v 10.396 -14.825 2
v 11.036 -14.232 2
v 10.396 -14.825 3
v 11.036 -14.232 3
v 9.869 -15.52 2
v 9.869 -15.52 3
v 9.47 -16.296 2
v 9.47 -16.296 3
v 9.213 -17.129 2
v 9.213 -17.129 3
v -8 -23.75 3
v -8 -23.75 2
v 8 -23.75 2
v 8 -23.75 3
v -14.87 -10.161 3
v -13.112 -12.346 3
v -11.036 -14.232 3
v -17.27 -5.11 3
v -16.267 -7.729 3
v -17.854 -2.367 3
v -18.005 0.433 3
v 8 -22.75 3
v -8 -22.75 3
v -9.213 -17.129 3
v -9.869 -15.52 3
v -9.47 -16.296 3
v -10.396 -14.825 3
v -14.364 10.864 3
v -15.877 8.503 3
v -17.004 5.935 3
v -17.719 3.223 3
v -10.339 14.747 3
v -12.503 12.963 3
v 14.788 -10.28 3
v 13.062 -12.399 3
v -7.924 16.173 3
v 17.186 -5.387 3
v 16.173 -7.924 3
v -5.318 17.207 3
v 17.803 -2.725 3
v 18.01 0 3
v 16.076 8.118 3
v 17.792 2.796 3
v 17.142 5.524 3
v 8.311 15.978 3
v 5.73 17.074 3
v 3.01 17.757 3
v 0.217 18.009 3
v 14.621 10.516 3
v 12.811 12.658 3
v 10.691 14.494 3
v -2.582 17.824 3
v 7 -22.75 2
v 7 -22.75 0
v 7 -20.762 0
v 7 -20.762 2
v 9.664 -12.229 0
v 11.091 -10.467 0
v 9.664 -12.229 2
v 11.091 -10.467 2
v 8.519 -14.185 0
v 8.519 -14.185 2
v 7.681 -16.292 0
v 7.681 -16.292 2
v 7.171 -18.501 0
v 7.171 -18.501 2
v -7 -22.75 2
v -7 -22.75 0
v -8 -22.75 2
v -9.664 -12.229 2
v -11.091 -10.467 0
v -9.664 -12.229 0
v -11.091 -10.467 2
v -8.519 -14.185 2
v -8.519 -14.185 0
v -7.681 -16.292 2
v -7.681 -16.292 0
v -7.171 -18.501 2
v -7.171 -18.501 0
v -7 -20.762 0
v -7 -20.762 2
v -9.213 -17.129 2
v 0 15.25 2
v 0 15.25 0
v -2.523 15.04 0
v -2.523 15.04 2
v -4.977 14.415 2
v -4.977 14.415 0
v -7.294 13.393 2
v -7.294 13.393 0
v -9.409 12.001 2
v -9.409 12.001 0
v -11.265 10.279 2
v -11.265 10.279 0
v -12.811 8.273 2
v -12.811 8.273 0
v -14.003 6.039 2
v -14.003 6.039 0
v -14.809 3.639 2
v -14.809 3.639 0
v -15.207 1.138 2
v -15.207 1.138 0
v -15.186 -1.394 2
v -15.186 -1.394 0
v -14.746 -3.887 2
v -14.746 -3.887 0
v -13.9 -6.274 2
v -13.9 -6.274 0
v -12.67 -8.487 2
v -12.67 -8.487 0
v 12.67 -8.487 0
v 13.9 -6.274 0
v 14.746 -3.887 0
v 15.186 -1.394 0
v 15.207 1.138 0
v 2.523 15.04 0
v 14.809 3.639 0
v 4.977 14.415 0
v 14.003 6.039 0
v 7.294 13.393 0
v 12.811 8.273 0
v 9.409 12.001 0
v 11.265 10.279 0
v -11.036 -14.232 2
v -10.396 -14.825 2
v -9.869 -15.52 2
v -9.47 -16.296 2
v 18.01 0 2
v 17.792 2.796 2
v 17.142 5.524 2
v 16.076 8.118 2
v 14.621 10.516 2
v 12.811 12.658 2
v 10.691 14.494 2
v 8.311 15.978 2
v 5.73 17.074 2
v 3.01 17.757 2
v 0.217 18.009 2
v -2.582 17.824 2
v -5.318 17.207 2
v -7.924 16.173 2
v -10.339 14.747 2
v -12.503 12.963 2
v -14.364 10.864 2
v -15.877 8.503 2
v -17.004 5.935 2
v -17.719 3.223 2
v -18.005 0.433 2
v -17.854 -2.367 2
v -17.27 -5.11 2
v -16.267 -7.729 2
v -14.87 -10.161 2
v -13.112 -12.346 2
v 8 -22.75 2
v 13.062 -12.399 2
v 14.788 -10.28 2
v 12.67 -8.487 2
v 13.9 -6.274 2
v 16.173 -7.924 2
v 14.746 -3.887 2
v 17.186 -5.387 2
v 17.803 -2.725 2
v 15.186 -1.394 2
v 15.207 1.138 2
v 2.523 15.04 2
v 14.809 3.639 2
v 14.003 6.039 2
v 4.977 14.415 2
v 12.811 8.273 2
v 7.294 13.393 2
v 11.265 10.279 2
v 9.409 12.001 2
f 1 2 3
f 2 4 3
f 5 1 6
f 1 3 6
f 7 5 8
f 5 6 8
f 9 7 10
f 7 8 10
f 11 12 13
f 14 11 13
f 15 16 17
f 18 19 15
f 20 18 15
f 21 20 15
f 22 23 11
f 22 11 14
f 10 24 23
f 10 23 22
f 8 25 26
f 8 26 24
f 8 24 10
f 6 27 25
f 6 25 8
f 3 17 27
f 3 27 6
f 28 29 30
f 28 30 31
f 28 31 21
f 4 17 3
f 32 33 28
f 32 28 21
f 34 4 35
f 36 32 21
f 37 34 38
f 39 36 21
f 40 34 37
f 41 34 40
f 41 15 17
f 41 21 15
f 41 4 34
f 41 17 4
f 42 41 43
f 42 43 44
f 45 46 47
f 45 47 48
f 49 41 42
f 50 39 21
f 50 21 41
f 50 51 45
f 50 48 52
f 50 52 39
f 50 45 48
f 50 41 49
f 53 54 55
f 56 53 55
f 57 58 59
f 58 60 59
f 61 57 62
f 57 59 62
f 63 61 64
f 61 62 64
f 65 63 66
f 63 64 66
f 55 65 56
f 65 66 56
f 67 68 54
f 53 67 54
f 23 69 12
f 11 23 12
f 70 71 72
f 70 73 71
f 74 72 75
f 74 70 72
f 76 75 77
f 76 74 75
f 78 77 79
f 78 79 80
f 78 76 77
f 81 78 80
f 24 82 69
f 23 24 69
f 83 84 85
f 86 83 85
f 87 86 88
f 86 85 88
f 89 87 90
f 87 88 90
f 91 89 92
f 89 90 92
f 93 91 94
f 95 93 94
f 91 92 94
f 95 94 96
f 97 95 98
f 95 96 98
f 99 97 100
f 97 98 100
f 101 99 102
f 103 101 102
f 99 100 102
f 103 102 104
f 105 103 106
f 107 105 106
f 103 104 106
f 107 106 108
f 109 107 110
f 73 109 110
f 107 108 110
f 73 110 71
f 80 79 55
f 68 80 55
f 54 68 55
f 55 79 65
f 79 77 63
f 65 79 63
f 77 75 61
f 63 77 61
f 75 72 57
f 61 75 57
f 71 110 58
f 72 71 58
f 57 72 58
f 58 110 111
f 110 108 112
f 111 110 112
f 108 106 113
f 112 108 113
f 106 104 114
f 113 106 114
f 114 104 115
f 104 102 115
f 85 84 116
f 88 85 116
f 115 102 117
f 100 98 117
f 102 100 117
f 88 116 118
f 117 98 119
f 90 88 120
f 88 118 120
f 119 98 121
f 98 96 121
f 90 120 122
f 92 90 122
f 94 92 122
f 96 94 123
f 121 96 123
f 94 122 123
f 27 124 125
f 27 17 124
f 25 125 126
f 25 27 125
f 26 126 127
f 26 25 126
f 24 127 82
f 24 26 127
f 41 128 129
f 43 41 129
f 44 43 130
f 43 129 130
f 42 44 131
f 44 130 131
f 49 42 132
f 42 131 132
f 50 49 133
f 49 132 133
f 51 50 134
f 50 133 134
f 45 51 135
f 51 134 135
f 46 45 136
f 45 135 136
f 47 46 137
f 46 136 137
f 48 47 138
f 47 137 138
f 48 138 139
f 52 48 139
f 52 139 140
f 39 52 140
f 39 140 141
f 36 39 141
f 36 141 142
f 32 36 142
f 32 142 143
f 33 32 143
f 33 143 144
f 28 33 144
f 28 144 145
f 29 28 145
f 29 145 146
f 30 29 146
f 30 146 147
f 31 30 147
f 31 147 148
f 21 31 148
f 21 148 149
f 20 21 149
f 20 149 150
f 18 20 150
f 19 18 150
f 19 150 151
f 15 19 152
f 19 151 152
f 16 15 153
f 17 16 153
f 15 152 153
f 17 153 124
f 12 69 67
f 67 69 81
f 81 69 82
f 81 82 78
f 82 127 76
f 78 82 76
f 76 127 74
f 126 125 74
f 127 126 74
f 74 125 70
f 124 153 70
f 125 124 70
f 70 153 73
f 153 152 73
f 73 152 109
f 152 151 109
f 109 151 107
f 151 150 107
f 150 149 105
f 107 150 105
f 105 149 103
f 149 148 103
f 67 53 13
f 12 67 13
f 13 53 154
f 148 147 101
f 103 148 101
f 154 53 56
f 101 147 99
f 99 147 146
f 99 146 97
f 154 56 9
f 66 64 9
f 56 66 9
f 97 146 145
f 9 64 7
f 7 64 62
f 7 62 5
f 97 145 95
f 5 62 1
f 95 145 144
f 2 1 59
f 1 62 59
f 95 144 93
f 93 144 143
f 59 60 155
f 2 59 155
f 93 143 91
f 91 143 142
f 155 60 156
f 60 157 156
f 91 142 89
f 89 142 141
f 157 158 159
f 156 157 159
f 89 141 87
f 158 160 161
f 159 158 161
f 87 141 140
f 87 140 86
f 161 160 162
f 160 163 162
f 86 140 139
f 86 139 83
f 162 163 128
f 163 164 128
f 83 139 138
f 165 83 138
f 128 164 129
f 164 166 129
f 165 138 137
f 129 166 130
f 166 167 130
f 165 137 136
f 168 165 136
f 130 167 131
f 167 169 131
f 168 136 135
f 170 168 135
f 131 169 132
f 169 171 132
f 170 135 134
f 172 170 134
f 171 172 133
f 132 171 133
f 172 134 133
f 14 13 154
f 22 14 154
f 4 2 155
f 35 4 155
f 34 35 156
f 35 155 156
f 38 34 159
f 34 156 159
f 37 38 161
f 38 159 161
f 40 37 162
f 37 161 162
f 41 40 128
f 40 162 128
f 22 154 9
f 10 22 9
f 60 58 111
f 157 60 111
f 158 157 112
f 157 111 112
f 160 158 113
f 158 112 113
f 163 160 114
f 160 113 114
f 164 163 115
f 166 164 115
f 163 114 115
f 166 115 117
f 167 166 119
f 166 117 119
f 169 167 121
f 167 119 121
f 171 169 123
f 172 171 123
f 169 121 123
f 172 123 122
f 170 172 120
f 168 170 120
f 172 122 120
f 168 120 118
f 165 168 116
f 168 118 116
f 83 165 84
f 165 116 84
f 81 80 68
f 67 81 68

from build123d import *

# Parameters (mm, degrees)
F1_DEPTH = 2
F2_R     = 15
F3_R     = 15
F4_W     = 14
F4_H     = 1
F5_DEPTH = 1
F6_R     = 5


with BuildPart() as f1:
    # F0 (on Top) → F1 (new body)
    with BuildSketch(Plane.XY):
        with BuildLine():
            Line((7, -16.75), (7, -13.5485239048))
            ThreePointArc((7, -13.5485239048), (14.8185270784, 3.6019099414), (0, 15.25))
            Line((0, 15.25), (0, -22.75))
            Line((0, -22.75), (7, -22.75))
            Line((7, -22.75), (7, -16.75))
        make_face()
        with BuildLine():
            Line((0, -22.75), (0, 15.25))
            ThreePointArc((0, 15.25), (-14.8185270784, 3.6019099414), (-7, -13.5485239048))
            Line((-7, -13.5485239048), (-7, -16.75))
            Line((-7, -16.75), (-7, -22.75))
            Line((-7, -22.75), (0, -22.75))
        make_face()
    extrude(amount=F1_DEPTH)

    # F2
    f2_edges = [f1.edges().sort_by_distance(p)[0] for p in [
        (-7, -13.548524, 1),
    ]]
    fillet(f2_edges, radius=F2_R)

    # F3
    f3_edges = [f1.edges().sort_by_distance(p)[0] for p in [
        (7, -13.548524, 1),
    ]]
    fillet(f3_edges, radius=F3_R)

    # F4 (on face) → F5 (join)
    with BuildSketch(Plane.XY.offset(2)):
        with BuildLine():
            ThreePointArc((9.62403785, -15.2229276029), (15.7747967541, -8.6899606851), (18.0099869334, 0))
            ThreePointArc((18.0099869334, 0), (-8.6899606851, 15.7747967541), (-9.62403785, -15.2229276029))
            ThreePointArc((-9.62403785, -15.2229276029), (0, -18.0099869334), (9.62403785, -15.2229276029))
        make_face()
        with BuildLine():
            ThreePointArc((9.62403785, -15.2229276029), (0, -18.0099869334), (-9.62403785, -15.2229276029))
            Line((-9.62403785, -15.2229276029), (-7, -22.75))
            Line((-7, -22.75), (7, -22.75))
            Line((7, -22.75), (9.62403785, -15.2229276029))
        make_face()
        Polygon((-7, -22.75), (-9.62403785, -15.2229276029), (-7, -23.75), align=None)
        Polygon((-7, -23.75), (-9.62403785, -15.2229276029), (-8, -22.75), (-8, -23.75), align=None)
        Polygon((7, -23.75), (9.62403785, -15.2229276029), (7, -22.75), align=None)
        Polygon((8, -22.75), (9.62403785, -15.2229276029), (7, -23.75), (8, -23.75), align=None)
        with Locations((0, -23.25)):
            Rectangle(F4_W, F4_H)
    extrude(amount=F5_DEPTH)

    # F6
    f6_edges = [f1.edges().sort_by_distance(p)[0] for p in [
        (9.624038, -15.222928, 2.5),
        (-9.624038, -15.222928, 2.5),
    ]]
    fillet(f6_edges, radius=F6_R)


solid = f1.part
